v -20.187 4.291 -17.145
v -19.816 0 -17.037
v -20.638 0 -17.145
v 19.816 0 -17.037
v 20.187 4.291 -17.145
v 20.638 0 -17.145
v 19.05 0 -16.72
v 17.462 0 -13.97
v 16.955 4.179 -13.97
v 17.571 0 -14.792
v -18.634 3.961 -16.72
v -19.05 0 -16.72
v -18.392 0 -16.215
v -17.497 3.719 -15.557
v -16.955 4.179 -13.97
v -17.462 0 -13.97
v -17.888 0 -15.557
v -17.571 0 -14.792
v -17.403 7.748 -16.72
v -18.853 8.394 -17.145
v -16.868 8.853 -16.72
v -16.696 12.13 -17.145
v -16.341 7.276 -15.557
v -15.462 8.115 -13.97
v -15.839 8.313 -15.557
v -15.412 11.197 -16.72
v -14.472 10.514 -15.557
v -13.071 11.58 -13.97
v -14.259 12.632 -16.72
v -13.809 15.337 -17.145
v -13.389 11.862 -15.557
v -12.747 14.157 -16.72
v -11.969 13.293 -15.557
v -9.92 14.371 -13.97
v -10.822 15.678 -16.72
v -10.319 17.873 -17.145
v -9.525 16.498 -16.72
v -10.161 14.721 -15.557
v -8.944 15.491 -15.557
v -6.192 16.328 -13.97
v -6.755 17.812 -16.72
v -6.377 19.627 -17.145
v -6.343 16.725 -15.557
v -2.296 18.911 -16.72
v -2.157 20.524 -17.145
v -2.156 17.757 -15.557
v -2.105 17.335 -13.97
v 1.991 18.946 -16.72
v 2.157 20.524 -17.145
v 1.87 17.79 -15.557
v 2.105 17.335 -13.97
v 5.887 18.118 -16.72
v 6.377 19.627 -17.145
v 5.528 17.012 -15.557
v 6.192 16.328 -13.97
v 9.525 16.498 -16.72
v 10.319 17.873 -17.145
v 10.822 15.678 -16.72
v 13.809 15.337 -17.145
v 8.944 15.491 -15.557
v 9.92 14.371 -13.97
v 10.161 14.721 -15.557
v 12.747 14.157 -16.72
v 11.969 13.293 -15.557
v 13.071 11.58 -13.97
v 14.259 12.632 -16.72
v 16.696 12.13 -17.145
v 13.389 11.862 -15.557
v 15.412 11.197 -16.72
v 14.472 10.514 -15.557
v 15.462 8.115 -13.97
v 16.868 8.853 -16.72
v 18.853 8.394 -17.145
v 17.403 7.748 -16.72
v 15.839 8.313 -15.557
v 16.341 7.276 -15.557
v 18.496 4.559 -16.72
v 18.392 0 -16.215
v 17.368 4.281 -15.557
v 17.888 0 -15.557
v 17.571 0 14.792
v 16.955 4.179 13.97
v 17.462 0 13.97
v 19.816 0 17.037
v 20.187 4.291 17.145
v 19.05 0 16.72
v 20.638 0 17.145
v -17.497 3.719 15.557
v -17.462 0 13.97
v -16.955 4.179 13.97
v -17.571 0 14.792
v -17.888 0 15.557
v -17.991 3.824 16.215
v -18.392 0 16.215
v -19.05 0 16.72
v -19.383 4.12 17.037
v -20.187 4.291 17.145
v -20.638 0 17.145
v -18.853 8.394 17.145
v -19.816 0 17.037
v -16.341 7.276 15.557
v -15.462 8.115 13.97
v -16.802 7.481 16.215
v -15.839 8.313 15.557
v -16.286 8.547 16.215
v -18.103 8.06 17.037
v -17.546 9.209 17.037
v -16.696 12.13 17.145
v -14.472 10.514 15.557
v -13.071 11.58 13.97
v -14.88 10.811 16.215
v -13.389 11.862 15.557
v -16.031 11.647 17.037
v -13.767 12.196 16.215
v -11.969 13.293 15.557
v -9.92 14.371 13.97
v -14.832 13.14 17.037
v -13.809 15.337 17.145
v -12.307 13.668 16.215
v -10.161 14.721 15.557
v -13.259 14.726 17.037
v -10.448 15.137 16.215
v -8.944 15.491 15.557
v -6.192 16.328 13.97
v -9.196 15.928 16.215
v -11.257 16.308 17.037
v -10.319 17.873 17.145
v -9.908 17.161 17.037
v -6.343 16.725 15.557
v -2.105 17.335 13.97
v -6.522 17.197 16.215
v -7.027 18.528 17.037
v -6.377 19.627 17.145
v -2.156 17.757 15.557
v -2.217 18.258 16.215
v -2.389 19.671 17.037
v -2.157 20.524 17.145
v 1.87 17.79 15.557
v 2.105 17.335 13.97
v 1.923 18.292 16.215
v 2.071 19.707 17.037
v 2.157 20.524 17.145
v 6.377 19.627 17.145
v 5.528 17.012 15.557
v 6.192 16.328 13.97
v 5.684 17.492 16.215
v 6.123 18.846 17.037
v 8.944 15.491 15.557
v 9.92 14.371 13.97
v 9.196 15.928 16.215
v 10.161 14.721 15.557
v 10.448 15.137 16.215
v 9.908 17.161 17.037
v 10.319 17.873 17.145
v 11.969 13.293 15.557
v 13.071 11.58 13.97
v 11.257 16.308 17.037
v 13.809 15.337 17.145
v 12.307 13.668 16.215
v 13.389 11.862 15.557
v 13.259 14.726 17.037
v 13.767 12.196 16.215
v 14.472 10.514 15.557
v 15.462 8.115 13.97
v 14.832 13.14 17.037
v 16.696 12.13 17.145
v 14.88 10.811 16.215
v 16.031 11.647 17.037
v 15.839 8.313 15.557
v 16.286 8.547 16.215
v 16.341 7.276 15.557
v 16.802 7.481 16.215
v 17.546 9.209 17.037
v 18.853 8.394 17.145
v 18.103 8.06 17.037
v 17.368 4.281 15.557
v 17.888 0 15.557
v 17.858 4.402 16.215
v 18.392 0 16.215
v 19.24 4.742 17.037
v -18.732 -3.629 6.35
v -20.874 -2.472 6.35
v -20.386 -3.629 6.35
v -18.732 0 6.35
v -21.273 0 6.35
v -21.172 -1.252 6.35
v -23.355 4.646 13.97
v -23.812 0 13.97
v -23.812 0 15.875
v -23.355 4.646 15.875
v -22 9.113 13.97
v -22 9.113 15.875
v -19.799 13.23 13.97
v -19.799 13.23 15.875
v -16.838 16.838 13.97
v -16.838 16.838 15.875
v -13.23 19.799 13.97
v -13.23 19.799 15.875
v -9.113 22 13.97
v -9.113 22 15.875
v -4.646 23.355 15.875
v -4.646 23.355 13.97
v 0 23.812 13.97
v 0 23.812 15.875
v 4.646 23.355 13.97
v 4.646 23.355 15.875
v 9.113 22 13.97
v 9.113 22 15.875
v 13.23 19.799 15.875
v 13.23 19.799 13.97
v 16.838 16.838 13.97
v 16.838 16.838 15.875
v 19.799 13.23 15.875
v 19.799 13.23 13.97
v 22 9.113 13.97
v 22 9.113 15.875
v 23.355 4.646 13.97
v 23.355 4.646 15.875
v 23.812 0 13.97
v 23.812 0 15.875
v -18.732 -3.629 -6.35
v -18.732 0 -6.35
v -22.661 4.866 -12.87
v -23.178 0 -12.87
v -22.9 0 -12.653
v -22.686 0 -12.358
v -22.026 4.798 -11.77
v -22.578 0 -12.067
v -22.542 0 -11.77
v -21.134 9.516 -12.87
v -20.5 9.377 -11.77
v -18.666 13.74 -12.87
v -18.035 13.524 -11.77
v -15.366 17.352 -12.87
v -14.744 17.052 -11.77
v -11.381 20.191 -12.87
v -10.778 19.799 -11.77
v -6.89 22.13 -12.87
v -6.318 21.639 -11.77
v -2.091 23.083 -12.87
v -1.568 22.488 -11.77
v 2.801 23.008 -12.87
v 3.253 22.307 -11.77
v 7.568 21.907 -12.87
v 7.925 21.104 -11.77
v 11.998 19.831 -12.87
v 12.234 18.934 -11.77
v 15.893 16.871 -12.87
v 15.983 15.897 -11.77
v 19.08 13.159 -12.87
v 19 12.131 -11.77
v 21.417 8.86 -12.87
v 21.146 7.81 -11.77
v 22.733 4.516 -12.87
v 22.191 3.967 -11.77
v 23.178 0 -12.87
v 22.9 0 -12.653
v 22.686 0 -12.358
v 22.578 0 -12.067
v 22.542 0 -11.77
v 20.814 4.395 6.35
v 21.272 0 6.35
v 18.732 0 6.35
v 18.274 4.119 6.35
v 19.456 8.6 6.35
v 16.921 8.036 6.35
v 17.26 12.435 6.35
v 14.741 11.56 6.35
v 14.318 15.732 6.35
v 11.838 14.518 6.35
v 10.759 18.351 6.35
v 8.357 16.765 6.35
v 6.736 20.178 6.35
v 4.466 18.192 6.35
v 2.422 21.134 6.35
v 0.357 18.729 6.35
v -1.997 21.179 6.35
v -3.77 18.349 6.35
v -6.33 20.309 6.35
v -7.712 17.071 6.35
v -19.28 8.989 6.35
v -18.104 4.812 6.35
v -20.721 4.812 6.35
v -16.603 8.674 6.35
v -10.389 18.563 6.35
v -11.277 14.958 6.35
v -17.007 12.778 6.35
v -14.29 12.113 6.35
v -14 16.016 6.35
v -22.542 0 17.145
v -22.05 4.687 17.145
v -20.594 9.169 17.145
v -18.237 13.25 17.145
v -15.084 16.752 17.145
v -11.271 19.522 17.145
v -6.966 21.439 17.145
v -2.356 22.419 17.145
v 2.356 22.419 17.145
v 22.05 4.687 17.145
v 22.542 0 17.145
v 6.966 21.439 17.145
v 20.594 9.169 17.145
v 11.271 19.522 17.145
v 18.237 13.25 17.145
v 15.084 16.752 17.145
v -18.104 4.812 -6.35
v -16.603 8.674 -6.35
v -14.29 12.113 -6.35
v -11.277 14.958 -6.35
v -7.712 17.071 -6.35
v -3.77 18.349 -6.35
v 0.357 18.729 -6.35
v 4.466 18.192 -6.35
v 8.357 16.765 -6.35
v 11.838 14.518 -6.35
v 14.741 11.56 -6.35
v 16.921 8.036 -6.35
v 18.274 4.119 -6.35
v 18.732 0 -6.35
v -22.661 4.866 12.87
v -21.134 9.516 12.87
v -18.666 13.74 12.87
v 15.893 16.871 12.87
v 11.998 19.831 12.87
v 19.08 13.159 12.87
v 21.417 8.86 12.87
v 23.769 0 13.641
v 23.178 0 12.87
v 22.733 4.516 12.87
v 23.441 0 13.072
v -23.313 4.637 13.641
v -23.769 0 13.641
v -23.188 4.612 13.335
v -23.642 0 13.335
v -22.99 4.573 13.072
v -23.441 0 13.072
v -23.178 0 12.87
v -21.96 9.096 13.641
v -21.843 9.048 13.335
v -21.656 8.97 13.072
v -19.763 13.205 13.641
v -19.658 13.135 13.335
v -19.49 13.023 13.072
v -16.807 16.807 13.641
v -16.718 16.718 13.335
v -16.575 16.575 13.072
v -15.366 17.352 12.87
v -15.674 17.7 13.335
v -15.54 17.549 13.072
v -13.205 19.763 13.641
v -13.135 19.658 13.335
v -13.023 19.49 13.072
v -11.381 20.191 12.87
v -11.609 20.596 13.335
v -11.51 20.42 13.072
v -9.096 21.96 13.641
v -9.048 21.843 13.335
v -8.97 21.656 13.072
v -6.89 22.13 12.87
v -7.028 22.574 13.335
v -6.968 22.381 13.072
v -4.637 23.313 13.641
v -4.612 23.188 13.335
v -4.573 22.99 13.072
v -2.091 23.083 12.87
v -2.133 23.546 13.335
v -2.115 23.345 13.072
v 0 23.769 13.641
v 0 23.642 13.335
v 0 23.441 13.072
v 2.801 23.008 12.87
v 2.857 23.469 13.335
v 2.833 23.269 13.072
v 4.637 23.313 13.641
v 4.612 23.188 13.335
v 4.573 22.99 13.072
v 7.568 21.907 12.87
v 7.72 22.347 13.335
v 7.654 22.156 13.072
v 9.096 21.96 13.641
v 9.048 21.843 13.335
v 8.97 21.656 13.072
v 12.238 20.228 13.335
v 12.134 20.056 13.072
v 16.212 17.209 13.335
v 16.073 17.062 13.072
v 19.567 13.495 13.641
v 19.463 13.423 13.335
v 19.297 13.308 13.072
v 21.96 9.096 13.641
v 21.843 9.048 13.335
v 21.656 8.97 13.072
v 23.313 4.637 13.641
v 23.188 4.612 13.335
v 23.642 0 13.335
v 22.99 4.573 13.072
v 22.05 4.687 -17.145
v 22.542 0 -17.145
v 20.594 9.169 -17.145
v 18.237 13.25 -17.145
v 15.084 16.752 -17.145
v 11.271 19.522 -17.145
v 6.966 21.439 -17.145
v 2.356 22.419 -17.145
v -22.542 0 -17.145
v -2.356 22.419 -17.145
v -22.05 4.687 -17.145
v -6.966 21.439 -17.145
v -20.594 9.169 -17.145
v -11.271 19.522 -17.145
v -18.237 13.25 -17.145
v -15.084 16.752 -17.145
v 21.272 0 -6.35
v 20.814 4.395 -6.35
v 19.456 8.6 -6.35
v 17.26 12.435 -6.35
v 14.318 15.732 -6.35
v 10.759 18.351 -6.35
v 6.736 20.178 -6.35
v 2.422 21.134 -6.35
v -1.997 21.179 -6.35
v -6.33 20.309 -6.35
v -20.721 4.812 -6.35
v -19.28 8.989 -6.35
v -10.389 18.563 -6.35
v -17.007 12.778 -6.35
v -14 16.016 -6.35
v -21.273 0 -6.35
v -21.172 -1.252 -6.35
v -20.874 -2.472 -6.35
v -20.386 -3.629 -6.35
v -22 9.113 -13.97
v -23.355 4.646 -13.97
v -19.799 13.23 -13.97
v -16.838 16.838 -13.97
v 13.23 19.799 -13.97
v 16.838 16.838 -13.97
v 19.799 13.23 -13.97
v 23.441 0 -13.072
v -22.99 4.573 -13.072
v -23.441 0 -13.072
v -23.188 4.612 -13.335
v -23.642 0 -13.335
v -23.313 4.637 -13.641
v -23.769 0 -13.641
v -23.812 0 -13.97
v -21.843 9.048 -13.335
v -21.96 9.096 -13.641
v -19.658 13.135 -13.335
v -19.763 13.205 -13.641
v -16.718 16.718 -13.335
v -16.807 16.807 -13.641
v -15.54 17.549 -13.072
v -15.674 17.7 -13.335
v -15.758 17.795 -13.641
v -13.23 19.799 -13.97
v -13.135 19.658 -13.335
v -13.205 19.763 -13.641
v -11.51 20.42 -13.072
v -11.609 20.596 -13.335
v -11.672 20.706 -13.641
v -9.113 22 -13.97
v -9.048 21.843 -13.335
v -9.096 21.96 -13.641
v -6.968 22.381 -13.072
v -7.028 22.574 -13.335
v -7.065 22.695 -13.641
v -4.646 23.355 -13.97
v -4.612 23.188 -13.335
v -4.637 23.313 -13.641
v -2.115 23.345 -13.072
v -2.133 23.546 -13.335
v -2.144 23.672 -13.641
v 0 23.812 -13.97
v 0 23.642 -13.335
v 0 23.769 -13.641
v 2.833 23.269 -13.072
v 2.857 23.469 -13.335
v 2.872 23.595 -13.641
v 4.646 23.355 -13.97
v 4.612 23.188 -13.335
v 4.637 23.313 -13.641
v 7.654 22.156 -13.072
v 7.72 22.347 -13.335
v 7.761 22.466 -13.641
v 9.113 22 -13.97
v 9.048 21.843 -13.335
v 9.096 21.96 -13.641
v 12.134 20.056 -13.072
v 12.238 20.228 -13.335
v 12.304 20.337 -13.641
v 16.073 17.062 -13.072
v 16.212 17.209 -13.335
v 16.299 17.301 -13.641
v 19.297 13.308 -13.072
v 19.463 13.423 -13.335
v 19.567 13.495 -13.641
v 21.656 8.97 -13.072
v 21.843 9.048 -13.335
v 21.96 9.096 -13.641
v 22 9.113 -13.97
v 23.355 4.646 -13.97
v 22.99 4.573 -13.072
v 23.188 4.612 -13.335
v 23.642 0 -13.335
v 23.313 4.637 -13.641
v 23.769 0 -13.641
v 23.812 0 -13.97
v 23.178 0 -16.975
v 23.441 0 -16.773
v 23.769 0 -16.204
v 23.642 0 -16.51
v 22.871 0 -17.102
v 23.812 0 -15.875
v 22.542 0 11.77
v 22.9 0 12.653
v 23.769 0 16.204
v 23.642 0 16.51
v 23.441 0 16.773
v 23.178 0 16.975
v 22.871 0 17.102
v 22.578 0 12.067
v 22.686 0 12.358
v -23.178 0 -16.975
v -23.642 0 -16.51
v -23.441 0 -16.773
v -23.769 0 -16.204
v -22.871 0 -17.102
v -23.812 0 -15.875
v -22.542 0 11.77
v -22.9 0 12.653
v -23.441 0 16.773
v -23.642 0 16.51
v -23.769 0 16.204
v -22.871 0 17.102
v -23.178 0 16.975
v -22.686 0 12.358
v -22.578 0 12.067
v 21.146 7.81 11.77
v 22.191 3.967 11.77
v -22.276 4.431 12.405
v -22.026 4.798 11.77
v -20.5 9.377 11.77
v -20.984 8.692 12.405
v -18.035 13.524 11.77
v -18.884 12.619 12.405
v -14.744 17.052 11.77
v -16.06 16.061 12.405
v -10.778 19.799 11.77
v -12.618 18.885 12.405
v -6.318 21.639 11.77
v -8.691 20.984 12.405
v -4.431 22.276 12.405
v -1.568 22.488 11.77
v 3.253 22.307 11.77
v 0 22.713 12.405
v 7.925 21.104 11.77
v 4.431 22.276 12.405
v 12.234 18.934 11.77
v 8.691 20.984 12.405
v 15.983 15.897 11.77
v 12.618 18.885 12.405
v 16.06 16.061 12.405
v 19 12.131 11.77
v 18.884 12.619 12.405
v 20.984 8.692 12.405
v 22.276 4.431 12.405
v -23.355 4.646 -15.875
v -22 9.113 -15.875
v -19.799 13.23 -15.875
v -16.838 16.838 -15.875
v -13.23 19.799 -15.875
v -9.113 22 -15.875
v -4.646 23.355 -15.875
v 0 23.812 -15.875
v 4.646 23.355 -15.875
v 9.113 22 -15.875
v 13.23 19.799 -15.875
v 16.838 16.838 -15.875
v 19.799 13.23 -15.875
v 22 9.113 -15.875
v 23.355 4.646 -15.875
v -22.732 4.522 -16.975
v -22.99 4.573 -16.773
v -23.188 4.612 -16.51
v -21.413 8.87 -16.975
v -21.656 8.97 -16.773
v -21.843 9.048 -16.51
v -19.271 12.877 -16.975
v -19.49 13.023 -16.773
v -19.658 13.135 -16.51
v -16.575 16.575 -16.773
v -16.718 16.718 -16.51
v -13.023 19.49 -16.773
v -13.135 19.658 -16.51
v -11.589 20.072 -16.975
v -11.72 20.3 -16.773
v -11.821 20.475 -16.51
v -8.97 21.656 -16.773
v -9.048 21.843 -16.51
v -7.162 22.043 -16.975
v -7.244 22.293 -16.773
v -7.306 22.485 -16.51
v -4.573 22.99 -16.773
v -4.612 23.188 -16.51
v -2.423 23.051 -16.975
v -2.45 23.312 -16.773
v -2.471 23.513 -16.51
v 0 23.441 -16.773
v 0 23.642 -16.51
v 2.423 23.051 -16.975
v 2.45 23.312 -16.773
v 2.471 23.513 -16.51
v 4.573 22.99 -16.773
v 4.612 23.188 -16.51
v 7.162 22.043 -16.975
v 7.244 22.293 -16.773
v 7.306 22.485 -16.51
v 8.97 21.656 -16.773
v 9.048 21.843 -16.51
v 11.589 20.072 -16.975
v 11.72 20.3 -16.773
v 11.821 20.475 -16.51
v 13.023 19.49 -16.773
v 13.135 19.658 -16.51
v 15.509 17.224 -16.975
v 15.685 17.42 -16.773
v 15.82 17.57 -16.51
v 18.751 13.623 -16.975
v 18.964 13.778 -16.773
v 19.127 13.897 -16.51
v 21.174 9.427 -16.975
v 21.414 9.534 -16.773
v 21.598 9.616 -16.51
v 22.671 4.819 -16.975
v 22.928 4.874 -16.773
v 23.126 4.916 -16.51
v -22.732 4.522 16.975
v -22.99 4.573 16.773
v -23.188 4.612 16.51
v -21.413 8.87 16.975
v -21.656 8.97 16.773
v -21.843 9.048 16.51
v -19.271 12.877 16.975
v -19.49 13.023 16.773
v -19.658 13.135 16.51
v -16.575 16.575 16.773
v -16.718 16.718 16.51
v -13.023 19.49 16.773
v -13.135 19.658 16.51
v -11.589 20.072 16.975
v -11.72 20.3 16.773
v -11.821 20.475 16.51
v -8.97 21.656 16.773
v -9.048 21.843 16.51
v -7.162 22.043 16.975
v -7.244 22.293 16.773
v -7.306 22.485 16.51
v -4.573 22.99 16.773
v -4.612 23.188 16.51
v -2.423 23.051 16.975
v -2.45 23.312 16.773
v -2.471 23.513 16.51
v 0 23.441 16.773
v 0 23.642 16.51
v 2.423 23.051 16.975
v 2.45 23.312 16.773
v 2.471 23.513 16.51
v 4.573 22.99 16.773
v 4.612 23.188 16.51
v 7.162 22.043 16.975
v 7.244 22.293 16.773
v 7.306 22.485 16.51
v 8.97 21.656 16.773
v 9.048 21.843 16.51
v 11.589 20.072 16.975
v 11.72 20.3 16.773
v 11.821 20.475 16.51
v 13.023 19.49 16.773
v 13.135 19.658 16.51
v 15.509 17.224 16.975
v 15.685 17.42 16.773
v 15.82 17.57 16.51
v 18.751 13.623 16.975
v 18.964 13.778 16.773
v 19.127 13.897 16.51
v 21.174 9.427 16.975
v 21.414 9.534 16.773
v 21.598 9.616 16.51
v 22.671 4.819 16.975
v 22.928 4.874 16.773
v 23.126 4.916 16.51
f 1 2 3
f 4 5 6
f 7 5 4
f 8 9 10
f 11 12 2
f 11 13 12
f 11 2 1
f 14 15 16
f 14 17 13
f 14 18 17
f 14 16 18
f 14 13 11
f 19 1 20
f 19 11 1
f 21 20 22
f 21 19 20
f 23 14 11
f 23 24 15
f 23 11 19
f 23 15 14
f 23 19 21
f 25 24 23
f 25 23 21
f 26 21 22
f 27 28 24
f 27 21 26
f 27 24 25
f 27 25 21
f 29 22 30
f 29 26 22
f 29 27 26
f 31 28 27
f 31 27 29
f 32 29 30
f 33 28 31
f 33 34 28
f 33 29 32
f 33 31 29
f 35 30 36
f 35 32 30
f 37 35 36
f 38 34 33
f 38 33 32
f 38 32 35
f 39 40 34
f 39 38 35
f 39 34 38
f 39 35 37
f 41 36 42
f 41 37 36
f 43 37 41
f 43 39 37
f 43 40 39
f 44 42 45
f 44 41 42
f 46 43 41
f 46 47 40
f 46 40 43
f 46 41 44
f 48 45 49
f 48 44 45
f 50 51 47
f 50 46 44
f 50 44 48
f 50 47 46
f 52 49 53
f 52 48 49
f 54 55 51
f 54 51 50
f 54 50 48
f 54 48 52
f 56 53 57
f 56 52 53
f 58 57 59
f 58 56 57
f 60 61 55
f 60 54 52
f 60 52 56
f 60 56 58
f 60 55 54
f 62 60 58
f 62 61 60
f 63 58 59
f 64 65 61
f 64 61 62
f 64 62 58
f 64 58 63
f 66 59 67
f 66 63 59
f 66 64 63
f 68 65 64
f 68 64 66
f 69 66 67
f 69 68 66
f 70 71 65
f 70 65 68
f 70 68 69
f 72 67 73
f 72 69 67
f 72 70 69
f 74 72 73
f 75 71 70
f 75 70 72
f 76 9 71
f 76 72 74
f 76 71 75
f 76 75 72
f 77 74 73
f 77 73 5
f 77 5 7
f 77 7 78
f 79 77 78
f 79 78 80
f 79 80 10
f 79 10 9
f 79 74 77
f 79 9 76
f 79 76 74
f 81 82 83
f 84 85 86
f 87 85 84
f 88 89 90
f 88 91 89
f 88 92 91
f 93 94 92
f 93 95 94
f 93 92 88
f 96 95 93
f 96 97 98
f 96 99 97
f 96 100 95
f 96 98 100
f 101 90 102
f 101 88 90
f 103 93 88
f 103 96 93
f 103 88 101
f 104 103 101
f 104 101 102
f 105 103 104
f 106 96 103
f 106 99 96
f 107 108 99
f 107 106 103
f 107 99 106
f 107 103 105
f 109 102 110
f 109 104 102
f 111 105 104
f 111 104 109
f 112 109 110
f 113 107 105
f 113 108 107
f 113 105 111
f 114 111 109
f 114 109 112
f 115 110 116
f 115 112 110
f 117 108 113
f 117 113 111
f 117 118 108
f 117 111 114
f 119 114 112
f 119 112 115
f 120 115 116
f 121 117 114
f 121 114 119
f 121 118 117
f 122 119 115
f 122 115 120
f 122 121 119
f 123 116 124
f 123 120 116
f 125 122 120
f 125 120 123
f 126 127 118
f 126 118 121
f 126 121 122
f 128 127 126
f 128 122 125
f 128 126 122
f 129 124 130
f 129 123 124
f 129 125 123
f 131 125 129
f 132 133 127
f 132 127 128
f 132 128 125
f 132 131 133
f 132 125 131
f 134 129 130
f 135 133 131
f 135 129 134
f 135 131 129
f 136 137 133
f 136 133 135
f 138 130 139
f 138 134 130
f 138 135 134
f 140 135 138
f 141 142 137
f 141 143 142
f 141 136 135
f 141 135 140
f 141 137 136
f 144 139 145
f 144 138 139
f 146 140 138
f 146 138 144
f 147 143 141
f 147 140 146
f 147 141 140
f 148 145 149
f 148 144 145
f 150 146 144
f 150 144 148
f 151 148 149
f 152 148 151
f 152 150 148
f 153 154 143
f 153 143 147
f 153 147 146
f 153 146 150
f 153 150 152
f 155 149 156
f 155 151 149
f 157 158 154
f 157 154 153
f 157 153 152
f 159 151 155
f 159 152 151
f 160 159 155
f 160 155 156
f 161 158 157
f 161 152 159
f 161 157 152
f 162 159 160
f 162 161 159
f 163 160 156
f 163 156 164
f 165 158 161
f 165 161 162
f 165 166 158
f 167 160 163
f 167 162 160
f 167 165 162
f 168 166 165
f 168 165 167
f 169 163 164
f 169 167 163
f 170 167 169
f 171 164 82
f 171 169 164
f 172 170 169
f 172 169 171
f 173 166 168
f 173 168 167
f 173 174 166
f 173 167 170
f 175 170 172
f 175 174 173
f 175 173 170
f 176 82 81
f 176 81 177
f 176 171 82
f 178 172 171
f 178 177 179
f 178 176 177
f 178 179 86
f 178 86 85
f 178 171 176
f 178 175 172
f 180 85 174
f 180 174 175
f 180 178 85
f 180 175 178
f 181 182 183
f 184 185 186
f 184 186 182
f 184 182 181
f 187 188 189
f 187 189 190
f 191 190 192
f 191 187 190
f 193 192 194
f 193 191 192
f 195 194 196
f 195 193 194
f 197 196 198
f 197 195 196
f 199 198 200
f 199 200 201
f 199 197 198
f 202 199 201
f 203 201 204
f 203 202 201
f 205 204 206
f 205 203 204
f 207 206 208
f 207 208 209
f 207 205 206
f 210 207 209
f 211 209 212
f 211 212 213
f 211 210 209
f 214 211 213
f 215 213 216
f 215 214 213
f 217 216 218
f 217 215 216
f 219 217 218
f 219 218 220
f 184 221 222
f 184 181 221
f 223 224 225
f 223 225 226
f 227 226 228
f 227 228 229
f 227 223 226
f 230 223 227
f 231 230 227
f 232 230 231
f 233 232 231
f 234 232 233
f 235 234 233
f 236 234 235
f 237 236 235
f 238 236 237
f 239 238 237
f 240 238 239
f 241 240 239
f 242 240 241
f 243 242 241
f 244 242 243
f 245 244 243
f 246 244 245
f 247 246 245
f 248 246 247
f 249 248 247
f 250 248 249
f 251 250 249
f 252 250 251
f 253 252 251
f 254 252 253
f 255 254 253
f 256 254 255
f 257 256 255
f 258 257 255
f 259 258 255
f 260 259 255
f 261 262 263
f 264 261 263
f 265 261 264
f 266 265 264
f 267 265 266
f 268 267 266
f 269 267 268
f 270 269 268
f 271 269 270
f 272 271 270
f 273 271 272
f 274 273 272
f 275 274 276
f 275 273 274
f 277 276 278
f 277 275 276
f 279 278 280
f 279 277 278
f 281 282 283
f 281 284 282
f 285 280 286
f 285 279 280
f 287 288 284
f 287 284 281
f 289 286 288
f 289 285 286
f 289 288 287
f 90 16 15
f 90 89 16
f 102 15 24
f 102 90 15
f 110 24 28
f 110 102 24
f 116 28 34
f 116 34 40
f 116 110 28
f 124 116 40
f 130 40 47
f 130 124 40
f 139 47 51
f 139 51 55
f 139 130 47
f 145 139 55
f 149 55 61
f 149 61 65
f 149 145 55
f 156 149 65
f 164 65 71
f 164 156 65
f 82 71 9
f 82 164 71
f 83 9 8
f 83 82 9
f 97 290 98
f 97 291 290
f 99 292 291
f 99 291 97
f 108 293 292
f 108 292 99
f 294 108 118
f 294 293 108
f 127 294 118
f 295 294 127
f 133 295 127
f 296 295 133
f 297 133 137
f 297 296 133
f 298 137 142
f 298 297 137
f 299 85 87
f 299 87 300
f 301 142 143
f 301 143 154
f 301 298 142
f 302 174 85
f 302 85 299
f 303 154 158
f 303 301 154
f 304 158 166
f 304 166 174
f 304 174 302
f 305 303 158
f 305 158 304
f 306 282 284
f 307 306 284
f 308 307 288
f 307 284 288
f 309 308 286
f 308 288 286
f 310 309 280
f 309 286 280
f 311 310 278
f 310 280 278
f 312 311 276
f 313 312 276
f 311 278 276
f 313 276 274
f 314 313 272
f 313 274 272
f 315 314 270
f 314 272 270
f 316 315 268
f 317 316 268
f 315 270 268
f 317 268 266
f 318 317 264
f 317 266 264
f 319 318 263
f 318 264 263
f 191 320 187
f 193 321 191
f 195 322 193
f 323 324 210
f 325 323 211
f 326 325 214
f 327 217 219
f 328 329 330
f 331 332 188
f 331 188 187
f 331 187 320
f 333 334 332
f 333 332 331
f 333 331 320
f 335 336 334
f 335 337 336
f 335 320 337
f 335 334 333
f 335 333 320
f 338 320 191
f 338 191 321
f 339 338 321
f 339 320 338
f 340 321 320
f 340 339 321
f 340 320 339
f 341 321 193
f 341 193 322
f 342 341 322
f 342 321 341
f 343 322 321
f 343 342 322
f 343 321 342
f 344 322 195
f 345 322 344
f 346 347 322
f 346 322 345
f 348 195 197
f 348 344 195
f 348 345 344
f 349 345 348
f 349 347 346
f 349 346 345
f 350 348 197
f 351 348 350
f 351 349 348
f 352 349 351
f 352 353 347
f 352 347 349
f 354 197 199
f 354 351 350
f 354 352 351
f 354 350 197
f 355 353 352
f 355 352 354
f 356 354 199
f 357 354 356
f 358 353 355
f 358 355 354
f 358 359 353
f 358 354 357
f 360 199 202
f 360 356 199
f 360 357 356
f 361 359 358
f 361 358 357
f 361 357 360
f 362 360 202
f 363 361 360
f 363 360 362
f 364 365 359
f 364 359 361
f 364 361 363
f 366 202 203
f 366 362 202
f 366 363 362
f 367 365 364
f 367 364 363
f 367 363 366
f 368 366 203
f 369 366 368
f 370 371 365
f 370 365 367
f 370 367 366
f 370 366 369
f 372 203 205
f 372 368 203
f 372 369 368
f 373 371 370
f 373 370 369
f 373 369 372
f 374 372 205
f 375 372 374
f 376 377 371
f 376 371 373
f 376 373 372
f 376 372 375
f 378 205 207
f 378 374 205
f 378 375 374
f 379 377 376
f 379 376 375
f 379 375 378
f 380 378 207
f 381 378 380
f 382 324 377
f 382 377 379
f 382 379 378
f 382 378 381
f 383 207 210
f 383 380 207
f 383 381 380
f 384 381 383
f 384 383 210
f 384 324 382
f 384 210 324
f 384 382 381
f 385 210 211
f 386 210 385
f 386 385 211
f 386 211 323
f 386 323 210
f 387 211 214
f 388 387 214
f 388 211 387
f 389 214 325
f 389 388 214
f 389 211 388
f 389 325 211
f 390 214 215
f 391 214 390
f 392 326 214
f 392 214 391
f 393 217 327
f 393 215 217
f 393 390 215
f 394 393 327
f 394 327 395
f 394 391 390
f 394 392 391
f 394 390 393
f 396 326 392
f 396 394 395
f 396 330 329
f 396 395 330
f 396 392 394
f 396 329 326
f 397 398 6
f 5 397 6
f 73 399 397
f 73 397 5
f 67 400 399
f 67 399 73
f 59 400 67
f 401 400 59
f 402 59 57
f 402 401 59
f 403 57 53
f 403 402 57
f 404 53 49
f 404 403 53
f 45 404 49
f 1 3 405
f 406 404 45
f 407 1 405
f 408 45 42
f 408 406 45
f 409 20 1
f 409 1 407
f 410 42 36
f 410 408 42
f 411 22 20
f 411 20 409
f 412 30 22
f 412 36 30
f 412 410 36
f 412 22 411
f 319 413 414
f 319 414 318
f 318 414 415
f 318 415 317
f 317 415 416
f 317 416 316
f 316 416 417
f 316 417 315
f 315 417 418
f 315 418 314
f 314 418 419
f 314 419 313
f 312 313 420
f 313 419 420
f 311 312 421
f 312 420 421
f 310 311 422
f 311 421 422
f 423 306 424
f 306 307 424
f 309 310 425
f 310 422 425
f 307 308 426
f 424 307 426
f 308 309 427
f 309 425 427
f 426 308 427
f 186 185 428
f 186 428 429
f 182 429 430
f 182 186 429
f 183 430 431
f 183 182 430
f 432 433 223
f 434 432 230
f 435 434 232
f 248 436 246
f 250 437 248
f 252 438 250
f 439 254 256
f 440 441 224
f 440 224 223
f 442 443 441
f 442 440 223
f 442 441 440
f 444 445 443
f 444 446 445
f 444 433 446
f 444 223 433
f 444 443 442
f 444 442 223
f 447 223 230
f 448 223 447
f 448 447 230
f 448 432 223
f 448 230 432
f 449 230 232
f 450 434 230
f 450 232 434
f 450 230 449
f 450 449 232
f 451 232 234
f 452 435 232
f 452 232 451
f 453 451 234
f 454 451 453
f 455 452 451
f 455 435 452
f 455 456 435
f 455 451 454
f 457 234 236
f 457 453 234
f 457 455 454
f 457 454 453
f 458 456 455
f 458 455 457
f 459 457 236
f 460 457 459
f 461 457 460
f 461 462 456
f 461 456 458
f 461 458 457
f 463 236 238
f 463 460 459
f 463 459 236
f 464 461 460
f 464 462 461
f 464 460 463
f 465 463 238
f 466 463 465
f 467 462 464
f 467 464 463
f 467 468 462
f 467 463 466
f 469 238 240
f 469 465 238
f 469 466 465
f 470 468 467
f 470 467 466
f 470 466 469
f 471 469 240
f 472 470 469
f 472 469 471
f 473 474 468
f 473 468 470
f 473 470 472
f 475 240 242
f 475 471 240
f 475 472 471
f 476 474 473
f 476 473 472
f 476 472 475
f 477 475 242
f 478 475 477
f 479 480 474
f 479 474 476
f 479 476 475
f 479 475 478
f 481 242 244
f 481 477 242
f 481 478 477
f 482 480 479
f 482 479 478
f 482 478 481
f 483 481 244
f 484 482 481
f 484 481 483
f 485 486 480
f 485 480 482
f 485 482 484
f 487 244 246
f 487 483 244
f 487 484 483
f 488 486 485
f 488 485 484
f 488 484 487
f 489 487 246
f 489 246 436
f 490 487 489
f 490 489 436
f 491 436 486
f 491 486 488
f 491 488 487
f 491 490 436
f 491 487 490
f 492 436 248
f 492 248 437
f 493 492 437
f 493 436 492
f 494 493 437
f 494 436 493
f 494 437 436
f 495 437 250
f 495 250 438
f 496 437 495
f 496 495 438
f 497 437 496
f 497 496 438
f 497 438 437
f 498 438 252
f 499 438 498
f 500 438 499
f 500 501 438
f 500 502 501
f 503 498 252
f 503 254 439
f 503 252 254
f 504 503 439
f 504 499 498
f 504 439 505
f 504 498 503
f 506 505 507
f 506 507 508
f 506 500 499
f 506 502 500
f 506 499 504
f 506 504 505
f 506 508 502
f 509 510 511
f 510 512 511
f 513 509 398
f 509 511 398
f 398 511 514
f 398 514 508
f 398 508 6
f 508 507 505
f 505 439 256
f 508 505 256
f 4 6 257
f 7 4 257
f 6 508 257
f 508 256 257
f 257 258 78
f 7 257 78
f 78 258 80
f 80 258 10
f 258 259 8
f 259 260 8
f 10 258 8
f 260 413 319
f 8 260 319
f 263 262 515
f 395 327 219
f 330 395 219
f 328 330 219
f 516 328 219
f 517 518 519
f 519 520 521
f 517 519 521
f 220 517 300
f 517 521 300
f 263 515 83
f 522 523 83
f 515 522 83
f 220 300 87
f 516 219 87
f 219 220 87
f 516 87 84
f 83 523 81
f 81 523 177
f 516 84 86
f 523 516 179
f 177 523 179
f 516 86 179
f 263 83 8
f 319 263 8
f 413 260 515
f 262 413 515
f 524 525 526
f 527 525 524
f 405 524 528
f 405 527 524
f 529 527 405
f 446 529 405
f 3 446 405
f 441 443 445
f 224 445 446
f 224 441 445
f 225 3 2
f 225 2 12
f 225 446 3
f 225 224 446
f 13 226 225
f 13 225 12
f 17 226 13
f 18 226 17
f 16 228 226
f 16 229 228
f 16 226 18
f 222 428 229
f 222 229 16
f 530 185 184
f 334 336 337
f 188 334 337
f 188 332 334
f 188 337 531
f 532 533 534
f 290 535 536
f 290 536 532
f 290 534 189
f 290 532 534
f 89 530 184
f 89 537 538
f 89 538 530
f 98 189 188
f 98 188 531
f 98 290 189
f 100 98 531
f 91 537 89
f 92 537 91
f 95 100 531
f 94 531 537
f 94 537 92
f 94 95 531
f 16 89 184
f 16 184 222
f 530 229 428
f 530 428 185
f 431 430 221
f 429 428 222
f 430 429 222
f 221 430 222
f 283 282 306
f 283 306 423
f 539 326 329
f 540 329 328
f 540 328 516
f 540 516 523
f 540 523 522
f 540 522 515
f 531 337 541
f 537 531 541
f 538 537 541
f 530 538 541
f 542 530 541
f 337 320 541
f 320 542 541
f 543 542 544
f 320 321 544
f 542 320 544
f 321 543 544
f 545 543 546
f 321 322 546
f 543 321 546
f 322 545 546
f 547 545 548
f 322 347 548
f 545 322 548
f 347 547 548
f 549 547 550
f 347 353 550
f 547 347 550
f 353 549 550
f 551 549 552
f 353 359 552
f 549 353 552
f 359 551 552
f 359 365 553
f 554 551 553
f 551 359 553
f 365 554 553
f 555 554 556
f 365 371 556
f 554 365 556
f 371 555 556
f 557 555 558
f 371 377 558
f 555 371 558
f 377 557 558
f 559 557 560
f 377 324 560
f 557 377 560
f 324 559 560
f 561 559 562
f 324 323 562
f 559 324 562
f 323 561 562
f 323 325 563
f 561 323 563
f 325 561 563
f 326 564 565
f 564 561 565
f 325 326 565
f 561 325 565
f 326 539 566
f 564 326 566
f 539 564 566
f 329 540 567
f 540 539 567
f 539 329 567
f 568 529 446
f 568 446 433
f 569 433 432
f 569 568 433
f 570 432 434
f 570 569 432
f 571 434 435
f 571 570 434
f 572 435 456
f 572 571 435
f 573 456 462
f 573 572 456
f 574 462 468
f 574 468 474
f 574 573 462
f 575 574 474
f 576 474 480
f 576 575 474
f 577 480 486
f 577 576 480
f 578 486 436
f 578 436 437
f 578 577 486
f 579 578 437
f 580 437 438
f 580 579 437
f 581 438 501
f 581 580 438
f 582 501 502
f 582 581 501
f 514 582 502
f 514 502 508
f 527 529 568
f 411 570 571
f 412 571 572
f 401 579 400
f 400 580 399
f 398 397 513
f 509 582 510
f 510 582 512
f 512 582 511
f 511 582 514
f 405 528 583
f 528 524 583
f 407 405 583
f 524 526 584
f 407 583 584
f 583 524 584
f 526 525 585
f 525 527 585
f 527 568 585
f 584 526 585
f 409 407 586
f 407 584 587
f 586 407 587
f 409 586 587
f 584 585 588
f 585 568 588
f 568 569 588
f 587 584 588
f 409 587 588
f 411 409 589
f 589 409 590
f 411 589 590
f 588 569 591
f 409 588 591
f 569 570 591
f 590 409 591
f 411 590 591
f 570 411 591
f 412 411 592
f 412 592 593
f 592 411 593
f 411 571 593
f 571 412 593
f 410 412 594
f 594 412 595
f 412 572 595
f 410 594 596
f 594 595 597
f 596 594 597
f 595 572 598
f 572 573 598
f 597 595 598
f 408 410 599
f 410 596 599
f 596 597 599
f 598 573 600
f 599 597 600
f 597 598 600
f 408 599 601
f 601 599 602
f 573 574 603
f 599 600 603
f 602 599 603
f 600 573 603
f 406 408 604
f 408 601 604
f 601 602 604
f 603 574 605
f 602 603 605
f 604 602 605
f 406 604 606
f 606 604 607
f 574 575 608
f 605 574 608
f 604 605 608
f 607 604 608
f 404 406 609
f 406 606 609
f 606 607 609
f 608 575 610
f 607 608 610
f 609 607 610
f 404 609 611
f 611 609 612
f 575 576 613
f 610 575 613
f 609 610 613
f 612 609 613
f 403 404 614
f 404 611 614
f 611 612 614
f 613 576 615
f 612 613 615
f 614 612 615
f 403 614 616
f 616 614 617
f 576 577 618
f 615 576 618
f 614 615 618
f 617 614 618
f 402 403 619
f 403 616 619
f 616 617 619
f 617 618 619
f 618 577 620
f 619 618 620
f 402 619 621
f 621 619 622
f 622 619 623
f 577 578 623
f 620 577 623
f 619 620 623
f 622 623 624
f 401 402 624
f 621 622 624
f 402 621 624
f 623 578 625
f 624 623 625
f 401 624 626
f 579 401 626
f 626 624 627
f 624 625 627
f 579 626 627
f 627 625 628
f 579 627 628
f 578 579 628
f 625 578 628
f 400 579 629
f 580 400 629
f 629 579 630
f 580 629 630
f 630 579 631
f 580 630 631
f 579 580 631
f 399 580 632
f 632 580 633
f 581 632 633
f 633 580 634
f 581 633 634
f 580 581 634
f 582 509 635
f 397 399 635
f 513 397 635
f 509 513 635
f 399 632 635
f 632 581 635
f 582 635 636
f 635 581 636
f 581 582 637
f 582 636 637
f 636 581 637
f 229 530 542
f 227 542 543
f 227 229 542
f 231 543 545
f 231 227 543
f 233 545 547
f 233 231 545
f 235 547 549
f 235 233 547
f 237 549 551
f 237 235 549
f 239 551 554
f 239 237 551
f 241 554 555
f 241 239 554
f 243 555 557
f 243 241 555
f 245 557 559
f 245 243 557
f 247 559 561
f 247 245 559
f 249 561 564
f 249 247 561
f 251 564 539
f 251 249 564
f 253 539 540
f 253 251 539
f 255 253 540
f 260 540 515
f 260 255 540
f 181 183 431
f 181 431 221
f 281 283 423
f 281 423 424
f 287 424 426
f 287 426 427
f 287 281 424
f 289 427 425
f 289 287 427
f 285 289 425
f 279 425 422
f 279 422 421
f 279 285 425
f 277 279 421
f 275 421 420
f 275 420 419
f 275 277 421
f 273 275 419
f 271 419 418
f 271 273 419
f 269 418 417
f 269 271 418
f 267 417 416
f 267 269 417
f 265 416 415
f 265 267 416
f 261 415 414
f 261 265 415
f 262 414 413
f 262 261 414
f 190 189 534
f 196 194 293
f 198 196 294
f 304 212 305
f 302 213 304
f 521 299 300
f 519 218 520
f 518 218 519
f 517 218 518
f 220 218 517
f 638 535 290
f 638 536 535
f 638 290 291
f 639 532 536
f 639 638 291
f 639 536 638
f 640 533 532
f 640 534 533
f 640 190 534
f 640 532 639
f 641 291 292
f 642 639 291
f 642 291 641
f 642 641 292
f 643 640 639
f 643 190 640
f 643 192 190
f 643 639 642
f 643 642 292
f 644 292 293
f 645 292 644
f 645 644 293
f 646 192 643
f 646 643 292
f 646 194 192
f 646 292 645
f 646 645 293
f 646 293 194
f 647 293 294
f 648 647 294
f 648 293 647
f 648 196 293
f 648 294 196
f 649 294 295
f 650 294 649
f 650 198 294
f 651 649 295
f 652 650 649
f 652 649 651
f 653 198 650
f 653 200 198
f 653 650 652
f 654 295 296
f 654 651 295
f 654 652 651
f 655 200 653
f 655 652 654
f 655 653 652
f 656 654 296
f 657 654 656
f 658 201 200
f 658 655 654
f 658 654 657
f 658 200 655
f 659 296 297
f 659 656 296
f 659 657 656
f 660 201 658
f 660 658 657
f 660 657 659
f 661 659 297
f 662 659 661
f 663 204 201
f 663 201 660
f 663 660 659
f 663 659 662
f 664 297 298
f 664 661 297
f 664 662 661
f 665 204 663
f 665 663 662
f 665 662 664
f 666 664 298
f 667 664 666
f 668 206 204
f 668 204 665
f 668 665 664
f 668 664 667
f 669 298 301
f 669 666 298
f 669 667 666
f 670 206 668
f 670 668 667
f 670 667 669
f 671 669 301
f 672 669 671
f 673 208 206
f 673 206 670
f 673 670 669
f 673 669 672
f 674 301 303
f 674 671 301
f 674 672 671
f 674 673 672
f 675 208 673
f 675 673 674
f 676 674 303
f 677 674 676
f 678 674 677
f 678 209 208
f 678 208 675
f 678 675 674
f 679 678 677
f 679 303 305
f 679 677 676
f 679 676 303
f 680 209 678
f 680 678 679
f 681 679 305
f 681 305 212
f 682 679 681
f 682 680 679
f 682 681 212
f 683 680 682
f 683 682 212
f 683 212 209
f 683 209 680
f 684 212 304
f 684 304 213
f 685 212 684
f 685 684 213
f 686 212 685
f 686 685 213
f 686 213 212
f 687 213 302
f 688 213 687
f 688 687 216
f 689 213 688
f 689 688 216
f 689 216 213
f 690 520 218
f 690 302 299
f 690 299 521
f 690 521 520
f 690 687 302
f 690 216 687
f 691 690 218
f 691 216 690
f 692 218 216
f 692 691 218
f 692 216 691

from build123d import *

# Parameters (mm, degrees)
F0_W     = 2.54
F0_H     = 12.7
F1_ANGLE = 180
F3_DEPTH = 6.35
F4_R     = 1.27


with BuildPart() as f1:
    # F0 (on Front) → F1 (revolve)
    with BuildSketch(Plane.XZ):
        with BuildLine():
            Line((-17.4625, -13.97), (-17.4625, 13.97))
            ThreePointArc((-17.4625, 13.97), (-18.392436, 16.215064), (-20.6375, 17.145))
            Line((-20.6375, 17.145), (-23.8125, 17.145))
            Line((-23.8125, 17.145), (-23.8125, 13.97))
            ThreePointArc((-23.8125, 13.97), (-23.440526, 13.071974), (-22.5425, 12.7))
            Line((-22.5425, 12.7), (-22.5425, -12.7))
            ThreePointArc((-22.5425, -12.7), (-23.440526, -13.071974), (-23.8125, -13.97))
            Line((-23.8125, -13.97), (-23.8125, -17.145))
            Line((-23.8125, -17.145), (-20.6375, -17.145))
            ThreePointArc((-20.6375, -17.145), (-18.392436, -16.215064), (-17.4625, -13.97))
        make_face()
        with Locations((-20.0025, 0)):
            Rectangle(F0_W, F0_H, mode=Mode.SUBTRACT)
    revolve(axis=Axis((0, 0, 0), (0, 0, -1)), revolution_arc=F1_ANGLE)

    # F2 (on Top) → F3 (join, symmetric)
    with BuildSketch(Plane.XY):
        with BuildLine():
            Line((-18.104011, 4.811585), (-20.721195, 4.811585))
            ThreePointArc((-20.721195, 4.811585), (-21.134224, 2.421533), (-21.2725, 0))
            ThreePointArc((-21.2725, 0), (-21.047769, -1.867615), (-20.386407, -3.628606))
            Line((-20.386407, -3.628606), (-18.7325, -3.628606))
            Line((-18.7325, -3.628606), (-18.7325, 0))
            ThreePointArc((-18.7325, 0), (-18.574713, 2.426229), (-18.104011, 4.811585))
        make_face()
    extrude(amount=F3_DEPTH, both=True)

    # F4
    f4_edges = [f1.edges().sort_by_distance(p)[0] for p in [
        (0, 22.5425, 12.7),
        (0, 22.5425, -12.7),
        (0, 23.8125, 17.145),
        (0, 23.8125, -17.145),
    ]]
    fillet(f4_edges, radius=F4_R)


solid = f1.part
